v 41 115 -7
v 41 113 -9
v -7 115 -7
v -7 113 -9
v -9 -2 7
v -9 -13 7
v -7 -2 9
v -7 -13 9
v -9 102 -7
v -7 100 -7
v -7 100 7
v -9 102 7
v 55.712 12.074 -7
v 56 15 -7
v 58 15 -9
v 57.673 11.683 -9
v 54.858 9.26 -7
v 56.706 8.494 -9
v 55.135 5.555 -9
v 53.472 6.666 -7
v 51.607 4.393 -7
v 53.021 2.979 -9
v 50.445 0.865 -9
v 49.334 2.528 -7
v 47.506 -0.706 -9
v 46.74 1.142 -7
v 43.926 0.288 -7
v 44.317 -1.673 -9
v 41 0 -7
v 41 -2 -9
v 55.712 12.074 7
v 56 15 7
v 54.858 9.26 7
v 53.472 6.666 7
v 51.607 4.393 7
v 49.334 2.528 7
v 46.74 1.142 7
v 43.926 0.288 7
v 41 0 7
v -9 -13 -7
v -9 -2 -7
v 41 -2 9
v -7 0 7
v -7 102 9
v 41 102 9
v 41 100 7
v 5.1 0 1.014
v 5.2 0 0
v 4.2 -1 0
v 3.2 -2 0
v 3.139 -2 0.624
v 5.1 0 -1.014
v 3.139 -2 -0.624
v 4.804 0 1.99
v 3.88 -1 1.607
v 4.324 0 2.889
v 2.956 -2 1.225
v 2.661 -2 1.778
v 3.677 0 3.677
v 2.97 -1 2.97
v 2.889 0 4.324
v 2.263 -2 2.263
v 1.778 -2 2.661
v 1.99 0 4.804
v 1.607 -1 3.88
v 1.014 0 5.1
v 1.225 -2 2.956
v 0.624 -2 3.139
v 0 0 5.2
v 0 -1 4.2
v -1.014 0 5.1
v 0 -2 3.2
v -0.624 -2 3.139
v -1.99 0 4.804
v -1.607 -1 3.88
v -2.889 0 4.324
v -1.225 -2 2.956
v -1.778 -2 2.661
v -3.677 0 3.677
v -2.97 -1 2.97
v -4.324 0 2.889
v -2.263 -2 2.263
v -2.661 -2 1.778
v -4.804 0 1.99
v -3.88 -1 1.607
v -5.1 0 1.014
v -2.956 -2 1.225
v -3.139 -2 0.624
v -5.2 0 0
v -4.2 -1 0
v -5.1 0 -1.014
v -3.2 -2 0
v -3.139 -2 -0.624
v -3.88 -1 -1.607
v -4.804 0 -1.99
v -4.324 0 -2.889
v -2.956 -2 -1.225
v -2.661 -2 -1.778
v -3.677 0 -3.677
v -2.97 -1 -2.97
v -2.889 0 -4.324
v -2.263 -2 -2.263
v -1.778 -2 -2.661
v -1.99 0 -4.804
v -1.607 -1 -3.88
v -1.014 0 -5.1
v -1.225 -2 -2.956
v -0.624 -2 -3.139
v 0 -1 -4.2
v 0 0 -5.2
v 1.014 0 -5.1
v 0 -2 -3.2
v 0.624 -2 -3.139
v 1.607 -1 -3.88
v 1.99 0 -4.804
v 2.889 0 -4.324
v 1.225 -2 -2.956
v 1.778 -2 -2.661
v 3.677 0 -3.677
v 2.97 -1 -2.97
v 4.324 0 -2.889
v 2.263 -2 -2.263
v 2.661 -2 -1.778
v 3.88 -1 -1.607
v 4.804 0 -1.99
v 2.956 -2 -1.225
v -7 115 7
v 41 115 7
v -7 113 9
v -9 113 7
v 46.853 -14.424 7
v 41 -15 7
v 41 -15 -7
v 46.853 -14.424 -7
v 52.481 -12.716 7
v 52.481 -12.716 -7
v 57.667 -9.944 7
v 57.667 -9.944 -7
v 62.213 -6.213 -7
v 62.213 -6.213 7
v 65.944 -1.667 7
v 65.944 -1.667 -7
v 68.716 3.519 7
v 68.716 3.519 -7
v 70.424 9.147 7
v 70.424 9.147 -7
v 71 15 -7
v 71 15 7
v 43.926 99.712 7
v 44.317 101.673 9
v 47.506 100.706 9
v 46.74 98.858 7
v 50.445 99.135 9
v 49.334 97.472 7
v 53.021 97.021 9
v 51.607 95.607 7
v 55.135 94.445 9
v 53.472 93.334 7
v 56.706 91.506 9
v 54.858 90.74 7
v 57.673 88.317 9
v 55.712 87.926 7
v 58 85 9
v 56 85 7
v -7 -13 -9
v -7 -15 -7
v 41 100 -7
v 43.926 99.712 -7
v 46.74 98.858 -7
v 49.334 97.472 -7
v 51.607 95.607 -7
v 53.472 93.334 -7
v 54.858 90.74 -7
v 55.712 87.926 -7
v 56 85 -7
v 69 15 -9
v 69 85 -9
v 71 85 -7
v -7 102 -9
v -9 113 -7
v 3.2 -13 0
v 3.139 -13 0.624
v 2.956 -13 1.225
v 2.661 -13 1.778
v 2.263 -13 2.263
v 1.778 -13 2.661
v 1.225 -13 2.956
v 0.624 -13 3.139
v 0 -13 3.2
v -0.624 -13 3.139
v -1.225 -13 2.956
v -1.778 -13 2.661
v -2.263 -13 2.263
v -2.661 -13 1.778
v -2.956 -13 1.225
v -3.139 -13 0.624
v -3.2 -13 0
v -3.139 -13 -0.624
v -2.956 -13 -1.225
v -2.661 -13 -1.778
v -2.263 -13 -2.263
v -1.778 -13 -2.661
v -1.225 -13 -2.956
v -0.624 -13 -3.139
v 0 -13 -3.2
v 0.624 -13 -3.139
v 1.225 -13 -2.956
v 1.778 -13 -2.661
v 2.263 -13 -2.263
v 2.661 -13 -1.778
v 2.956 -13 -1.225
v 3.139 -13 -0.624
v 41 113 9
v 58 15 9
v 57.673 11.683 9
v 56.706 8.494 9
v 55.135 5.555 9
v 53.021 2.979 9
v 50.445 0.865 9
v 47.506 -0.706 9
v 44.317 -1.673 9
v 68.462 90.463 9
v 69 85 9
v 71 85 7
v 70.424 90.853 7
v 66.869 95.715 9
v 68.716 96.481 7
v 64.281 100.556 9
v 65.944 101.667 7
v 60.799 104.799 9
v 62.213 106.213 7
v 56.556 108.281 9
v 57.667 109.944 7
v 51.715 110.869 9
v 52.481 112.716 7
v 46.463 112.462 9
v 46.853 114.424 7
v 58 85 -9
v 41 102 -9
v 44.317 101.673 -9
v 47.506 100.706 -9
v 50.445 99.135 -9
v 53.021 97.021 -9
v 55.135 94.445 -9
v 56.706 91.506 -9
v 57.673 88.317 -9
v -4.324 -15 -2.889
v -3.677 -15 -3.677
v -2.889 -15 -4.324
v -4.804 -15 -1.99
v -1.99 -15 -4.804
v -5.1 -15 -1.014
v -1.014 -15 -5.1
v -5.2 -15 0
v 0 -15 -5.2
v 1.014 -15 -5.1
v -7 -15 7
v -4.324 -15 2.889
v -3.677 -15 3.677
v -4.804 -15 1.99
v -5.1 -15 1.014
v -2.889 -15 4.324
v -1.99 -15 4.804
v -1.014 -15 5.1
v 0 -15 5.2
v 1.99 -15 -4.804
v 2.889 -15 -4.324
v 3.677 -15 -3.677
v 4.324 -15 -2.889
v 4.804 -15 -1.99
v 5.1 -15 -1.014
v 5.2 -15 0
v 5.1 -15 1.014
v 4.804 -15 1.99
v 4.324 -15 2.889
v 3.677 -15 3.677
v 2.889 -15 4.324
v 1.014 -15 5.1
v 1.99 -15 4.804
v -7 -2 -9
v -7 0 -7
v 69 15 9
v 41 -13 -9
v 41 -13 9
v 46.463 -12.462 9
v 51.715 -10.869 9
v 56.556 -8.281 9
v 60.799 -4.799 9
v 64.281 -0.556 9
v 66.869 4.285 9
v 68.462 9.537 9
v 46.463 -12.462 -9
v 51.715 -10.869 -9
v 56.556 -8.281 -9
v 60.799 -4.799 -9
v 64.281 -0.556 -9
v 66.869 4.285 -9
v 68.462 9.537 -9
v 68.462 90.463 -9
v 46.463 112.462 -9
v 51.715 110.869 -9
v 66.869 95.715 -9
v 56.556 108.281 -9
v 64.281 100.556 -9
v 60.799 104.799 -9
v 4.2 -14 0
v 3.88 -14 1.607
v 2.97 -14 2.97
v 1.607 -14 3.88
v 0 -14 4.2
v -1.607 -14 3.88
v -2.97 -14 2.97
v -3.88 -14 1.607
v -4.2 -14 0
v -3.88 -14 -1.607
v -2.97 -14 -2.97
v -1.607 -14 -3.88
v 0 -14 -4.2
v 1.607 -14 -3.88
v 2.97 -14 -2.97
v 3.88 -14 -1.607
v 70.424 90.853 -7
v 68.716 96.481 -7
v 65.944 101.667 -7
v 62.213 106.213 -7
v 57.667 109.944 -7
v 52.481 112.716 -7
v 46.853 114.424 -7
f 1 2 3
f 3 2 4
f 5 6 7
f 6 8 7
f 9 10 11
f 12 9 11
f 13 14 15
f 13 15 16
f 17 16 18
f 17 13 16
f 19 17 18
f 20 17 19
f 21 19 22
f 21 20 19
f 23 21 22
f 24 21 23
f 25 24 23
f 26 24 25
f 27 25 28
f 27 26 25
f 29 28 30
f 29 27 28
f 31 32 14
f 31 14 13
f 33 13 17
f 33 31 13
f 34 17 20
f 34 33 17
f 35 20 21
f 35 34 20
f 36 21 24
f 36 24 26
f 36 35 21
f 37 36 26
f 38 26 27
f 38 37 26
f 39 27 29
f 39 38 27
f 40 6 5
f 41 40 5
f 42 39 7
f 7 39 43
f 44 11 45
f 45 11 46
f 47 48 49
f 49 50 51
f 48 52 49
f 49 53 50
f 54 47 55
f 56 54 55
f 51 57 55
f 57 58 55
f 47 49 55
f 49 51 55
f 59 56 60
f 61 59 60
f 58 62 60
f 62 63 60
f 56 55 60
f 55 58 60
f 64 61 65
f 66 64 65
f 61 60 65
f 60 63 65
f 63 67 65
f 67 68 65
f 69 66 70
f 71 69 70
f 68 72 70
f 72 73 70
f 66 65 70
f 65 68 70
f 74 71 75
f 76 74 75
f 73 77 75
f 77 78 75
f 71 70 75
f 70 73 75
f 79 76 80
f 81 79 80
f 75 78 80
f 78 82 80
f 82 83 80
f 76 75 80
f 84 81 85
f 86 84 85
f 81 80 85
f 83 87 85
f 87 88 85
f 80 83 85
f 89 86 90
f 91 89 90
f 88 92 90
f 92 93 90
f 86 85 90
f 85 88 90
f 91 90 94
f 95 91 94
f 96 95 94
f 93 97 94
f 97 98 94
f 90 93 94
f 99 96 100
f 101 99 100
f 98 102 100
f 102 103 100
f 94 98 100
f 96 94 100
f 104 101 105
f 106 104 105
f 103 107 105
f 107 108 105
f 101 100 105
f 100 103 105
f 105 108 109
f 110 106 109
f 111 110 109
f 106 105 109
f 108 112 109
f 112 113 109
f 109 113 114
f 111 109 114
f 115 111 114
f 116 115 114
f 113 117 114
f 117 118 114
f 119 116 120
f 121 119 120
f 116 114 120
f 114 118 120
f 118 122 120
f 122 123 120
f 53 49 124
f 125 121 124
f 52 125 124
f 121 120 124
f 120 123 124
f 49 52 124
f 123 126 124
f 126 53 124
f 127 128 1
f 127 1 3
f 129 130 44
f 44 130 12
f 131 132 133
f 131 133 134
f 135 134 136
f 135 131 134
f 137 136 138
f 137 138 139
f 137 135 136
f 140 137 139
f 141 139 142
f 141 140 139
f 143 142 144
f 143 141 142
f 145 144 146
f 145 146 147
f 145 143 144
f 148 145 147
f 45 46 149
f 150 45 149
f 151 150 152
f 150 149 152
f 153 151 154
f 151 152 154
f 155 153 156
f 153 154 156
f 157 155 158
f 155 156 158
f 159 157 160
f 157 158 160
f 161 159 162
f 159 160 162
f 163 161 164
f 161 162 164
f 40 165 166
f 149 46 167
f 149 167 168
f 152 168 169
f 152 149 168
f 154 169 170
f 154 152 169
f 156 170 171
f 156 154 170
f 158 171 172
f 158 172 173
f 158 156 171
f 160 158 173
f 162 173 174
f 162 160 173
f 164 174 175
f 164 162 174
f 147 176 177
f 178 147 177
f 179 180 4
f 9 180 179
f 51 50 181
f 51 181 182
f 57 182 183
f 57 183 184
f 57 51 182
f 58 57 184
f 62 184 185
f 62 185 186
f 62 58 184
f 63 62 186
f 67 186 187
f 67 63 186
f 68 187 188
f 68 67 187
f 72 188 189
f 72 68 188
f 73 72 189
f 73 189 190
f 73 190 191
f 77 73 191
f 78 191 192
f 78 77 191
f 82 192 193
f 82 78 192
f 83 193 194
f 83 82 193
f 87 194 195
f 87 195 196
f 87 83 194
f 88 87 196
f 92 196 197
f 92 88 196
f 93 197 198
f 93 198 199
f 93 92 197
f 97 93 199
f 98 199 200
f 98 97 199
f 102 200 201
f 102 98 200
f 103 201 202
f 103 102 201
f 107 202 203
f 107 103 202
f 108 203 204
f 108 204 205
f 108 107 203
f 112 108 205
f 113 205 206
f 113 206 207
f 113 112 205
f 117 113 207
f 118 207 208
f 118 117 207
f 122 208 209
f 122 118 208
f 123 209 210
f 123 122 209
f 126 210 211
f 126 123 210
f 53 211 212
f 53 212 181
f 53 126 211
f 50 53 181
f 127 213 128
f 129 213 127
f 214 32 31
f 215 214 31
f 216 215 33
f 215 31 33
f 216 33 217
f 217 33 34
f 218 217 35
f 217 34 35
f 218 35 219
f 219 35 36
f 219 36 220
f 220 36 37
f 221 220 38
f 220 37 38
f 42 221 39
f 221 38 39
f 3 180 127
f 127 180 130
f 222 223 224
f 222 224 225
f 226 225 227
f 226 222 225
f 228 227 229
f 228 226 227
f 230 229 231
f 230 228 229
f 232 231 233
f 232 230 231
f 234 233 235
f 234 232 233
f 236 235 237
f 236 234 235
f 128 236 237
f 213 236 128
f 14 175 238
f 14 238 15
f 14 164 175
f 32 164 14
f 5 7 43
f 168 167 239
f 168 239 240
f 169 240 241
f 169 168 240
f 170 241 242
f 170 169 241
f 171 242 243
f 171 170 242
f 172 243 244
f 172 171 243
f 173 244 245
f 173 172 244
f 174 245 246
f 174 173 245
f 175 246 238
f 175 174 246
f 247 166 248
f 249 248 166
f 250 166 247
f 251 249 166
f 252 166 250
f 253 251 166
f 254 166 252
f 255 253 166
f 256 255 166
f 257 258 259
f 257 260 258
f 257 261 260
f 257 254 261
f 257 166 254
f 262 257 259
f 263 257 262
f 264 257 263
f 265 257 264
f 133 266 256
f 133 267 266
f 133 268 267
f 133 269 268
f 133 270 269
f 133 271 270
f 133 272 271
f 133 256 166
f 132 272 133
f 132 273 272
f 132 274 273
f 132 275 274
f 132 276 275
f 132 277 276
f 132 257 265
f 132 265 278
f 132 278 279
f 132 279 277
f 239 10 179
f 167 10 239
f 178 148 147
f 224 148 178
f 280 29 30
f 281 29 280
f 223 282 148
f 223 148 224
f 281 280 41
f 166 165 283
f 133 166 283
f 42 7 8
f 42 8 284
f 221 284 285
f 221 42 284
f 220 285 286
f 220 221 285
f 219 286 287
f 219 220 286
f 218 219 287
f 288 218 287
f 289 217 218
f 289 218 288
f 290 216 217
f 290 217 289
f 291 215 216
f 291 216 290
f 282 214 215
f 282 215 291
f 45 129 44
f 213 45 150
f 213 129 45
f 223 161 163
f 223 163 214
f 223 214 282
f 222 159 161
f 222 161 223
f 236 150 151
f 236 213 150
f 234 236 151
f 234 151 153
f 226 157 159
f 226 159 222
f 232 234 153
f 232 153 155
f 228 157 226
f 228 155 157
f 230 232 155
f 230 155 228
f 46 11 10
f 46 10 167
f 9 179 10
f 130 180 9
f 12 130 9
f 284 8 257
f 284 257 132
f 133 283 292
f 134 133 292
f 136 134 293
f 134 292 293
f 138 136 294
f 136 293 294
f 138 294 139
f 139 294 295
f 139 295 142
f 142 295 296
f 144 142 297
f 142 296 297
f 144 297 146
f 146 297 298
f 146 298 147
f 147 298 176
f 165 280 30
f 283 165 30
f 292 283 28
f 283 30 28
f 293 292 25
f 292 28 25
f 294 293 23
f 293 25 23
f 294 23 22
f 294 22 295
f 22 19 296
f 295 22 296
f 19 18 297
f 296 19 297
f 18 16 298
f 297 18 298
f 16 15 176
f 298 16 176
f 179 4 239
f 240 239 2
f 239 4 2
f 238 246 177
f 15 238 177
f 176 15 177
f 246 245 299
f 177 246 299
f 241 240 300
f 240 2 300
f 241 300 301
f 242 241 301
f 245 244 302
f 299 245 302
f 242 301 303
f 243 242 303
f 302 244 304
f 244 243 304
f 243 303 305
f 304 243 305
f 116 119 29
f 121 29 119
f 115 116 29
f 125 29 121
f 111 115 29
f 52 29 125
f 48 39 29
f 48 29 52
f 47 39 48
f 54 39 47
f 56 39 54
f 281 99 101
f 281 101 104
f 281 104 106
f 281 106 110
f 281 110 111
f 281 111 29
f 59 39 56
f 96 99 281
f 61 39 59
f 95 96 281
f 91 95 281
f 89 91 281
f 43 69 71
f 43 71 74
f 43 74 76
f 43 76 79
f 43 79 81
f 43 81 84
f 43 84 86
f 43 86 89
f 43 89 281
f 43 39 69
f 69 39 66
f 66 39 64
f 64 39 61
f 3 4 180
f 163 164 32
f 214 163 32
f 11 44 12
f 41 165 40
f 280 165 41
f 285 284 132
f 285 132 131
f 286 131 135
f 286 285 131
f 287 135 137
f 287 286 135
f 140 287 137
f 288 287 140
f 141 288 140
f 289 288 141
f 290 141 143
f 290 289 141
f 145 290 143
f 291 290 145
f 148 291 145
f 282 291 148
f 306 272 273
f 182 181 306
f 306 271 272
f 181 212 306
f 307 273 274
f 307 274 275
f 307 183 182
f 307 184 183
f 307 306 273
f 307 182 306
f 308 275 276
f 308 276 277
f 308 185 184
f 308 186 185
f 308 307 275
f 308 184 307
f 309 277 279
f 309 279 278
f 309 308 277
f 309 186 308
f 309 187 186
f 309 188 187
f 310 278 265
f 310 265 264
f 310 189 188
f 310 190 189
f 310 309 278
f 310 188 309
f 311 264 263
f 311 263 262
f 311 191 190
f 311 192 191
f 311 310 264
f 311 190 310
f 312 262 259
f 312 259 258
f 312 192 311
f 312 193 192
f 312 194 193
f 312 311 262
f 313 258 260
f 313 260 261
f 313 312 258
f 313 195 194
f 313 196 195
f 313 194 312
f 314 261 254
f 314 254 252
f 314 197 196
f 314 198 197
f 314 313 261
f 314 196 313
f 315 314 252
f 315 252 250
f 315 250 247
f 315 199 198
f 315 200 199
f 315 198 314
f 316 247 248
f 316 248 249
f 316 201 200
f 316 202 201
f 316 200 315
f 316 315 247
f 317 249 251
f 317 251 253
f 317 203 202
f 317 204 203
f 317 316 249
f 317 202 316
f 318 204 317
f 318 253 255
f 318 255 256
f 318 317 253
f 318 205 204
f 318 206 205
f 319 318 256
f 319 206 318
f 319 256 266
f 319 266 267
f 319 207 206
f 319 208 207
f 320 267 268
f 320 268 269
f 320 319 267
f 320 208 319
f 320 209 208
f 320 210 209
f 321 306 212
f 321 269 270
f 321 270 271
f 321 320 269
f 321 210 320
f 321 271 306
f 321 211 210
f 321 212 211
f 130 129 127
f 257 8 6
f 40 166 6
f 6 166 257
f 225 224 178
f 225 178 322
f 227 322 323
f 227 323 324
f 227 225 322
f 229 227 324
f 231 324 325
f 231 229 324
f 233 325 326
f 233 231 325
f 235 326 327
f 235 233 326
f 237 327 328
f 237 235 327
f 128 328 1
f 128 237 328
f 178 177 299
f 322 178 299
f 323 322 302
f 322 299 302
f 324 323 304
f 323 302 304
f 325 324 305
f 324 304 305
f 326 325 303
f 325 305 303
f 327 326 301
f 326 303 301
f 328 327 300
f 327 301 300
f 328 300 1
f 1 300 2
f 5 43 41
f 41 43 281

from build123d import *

# Parameters (mm, degrees)
F0_W     = 9
F0_H     = 15
F0_W_2   = 3.2
F1_DEPTH = 9
F3_SIZE  = 2


# Not quite as in the source:
# - a feature names something its author has since deleted; it is built from what else it names


with BuildPart() as f1:
    # F0 (on Top) → F1 (new body, symmetric)
    with BuildSketch(Plane.XY):
        with Locations((-4.5, -7.5)):
            Rectangle(F0_W, F0_H)
        with Locations((1.6, -7.5)):
            Rectangle(F0_W_2, F0_H)
        with BuildLine():
            Line((41, 0), (3.2, 0))
            Line((3.2, 0), (3.2, -15))
            Line((3.2, -15), (41, -15))
            ThreePointArc((41, -15), (62.2132034356, -6.2132034356), (71, 15))
            Line((71, 15), (71, 85))
            ThreePointArc((71, 85), (62.2132034356, 106.2132034356), (41, 115))
            Line((41, 115), (-9, 115))
            Line((-9, 115), (-9, 100))
            Line((-9, 100), (41, 100))
            ThreePointArc((41, 100), (51.6066017178, 95.6066017178), (56, 85))
            Line((56, 85), (56, 15))
            ThreePointArc((56, 15), (51.6066017178, 4.3933982822), (41, 0))
        make_face()
    extrude(amount=F1_DEPTH, both=True)

    # F0 (on Top) → F2 (revolve, cut)
    with BuildSketch(Plane.XY):
        with Locations((1.6, -7.5)):
            Rectangle(F0_W_2, F0_H)
    revolve(axis=Axis((0, -7.5, 0), (0, -1, 0)), mode=Mode.SUBTRACT)

    # F3
    f3_edges = [f1.edges().sort_by_distance(p)[0] for p in [
        (-9, -7.5, 9),
        (16, -15, 9),
        (62.213203, -6.213203, 9),
        (71, 50, 9),
        (62.213203, 106.213203, 9),
        (16, 115, 9),
        (-9, 107.5, 9),
        (16, 100, 9),
        (51.606602, 95.606602, 9),
        (56, 50, 9),
        (51.606602, 4.393398, 9),
        (16, 0, 9),
        (-9, -7.5, -9),
        (16, -15, -9),
        (62.213203, -6.213203, -9),
        (71, 50, -9),
        (62.213203, 106.213203, -9),
        (16, 115, -9),
        (-9, 107.5, -9),
        (16, 100, -9),
        (51.606602, 95.606602, -9),
        (56, 50, -9),
        (51.606602, 4.393398, -9),
        (16, 0, -9),
        (-9, -15, 0),
        (-9, 0, 0),
        (-9, 115, 0),
        (-9, 100, 0),
        (-3.2, -15, 0),
        (-3.2, 0, 0),
    ]]
    chamfer(f3_edges, length=F3_SIZE)


solid = f1.part
